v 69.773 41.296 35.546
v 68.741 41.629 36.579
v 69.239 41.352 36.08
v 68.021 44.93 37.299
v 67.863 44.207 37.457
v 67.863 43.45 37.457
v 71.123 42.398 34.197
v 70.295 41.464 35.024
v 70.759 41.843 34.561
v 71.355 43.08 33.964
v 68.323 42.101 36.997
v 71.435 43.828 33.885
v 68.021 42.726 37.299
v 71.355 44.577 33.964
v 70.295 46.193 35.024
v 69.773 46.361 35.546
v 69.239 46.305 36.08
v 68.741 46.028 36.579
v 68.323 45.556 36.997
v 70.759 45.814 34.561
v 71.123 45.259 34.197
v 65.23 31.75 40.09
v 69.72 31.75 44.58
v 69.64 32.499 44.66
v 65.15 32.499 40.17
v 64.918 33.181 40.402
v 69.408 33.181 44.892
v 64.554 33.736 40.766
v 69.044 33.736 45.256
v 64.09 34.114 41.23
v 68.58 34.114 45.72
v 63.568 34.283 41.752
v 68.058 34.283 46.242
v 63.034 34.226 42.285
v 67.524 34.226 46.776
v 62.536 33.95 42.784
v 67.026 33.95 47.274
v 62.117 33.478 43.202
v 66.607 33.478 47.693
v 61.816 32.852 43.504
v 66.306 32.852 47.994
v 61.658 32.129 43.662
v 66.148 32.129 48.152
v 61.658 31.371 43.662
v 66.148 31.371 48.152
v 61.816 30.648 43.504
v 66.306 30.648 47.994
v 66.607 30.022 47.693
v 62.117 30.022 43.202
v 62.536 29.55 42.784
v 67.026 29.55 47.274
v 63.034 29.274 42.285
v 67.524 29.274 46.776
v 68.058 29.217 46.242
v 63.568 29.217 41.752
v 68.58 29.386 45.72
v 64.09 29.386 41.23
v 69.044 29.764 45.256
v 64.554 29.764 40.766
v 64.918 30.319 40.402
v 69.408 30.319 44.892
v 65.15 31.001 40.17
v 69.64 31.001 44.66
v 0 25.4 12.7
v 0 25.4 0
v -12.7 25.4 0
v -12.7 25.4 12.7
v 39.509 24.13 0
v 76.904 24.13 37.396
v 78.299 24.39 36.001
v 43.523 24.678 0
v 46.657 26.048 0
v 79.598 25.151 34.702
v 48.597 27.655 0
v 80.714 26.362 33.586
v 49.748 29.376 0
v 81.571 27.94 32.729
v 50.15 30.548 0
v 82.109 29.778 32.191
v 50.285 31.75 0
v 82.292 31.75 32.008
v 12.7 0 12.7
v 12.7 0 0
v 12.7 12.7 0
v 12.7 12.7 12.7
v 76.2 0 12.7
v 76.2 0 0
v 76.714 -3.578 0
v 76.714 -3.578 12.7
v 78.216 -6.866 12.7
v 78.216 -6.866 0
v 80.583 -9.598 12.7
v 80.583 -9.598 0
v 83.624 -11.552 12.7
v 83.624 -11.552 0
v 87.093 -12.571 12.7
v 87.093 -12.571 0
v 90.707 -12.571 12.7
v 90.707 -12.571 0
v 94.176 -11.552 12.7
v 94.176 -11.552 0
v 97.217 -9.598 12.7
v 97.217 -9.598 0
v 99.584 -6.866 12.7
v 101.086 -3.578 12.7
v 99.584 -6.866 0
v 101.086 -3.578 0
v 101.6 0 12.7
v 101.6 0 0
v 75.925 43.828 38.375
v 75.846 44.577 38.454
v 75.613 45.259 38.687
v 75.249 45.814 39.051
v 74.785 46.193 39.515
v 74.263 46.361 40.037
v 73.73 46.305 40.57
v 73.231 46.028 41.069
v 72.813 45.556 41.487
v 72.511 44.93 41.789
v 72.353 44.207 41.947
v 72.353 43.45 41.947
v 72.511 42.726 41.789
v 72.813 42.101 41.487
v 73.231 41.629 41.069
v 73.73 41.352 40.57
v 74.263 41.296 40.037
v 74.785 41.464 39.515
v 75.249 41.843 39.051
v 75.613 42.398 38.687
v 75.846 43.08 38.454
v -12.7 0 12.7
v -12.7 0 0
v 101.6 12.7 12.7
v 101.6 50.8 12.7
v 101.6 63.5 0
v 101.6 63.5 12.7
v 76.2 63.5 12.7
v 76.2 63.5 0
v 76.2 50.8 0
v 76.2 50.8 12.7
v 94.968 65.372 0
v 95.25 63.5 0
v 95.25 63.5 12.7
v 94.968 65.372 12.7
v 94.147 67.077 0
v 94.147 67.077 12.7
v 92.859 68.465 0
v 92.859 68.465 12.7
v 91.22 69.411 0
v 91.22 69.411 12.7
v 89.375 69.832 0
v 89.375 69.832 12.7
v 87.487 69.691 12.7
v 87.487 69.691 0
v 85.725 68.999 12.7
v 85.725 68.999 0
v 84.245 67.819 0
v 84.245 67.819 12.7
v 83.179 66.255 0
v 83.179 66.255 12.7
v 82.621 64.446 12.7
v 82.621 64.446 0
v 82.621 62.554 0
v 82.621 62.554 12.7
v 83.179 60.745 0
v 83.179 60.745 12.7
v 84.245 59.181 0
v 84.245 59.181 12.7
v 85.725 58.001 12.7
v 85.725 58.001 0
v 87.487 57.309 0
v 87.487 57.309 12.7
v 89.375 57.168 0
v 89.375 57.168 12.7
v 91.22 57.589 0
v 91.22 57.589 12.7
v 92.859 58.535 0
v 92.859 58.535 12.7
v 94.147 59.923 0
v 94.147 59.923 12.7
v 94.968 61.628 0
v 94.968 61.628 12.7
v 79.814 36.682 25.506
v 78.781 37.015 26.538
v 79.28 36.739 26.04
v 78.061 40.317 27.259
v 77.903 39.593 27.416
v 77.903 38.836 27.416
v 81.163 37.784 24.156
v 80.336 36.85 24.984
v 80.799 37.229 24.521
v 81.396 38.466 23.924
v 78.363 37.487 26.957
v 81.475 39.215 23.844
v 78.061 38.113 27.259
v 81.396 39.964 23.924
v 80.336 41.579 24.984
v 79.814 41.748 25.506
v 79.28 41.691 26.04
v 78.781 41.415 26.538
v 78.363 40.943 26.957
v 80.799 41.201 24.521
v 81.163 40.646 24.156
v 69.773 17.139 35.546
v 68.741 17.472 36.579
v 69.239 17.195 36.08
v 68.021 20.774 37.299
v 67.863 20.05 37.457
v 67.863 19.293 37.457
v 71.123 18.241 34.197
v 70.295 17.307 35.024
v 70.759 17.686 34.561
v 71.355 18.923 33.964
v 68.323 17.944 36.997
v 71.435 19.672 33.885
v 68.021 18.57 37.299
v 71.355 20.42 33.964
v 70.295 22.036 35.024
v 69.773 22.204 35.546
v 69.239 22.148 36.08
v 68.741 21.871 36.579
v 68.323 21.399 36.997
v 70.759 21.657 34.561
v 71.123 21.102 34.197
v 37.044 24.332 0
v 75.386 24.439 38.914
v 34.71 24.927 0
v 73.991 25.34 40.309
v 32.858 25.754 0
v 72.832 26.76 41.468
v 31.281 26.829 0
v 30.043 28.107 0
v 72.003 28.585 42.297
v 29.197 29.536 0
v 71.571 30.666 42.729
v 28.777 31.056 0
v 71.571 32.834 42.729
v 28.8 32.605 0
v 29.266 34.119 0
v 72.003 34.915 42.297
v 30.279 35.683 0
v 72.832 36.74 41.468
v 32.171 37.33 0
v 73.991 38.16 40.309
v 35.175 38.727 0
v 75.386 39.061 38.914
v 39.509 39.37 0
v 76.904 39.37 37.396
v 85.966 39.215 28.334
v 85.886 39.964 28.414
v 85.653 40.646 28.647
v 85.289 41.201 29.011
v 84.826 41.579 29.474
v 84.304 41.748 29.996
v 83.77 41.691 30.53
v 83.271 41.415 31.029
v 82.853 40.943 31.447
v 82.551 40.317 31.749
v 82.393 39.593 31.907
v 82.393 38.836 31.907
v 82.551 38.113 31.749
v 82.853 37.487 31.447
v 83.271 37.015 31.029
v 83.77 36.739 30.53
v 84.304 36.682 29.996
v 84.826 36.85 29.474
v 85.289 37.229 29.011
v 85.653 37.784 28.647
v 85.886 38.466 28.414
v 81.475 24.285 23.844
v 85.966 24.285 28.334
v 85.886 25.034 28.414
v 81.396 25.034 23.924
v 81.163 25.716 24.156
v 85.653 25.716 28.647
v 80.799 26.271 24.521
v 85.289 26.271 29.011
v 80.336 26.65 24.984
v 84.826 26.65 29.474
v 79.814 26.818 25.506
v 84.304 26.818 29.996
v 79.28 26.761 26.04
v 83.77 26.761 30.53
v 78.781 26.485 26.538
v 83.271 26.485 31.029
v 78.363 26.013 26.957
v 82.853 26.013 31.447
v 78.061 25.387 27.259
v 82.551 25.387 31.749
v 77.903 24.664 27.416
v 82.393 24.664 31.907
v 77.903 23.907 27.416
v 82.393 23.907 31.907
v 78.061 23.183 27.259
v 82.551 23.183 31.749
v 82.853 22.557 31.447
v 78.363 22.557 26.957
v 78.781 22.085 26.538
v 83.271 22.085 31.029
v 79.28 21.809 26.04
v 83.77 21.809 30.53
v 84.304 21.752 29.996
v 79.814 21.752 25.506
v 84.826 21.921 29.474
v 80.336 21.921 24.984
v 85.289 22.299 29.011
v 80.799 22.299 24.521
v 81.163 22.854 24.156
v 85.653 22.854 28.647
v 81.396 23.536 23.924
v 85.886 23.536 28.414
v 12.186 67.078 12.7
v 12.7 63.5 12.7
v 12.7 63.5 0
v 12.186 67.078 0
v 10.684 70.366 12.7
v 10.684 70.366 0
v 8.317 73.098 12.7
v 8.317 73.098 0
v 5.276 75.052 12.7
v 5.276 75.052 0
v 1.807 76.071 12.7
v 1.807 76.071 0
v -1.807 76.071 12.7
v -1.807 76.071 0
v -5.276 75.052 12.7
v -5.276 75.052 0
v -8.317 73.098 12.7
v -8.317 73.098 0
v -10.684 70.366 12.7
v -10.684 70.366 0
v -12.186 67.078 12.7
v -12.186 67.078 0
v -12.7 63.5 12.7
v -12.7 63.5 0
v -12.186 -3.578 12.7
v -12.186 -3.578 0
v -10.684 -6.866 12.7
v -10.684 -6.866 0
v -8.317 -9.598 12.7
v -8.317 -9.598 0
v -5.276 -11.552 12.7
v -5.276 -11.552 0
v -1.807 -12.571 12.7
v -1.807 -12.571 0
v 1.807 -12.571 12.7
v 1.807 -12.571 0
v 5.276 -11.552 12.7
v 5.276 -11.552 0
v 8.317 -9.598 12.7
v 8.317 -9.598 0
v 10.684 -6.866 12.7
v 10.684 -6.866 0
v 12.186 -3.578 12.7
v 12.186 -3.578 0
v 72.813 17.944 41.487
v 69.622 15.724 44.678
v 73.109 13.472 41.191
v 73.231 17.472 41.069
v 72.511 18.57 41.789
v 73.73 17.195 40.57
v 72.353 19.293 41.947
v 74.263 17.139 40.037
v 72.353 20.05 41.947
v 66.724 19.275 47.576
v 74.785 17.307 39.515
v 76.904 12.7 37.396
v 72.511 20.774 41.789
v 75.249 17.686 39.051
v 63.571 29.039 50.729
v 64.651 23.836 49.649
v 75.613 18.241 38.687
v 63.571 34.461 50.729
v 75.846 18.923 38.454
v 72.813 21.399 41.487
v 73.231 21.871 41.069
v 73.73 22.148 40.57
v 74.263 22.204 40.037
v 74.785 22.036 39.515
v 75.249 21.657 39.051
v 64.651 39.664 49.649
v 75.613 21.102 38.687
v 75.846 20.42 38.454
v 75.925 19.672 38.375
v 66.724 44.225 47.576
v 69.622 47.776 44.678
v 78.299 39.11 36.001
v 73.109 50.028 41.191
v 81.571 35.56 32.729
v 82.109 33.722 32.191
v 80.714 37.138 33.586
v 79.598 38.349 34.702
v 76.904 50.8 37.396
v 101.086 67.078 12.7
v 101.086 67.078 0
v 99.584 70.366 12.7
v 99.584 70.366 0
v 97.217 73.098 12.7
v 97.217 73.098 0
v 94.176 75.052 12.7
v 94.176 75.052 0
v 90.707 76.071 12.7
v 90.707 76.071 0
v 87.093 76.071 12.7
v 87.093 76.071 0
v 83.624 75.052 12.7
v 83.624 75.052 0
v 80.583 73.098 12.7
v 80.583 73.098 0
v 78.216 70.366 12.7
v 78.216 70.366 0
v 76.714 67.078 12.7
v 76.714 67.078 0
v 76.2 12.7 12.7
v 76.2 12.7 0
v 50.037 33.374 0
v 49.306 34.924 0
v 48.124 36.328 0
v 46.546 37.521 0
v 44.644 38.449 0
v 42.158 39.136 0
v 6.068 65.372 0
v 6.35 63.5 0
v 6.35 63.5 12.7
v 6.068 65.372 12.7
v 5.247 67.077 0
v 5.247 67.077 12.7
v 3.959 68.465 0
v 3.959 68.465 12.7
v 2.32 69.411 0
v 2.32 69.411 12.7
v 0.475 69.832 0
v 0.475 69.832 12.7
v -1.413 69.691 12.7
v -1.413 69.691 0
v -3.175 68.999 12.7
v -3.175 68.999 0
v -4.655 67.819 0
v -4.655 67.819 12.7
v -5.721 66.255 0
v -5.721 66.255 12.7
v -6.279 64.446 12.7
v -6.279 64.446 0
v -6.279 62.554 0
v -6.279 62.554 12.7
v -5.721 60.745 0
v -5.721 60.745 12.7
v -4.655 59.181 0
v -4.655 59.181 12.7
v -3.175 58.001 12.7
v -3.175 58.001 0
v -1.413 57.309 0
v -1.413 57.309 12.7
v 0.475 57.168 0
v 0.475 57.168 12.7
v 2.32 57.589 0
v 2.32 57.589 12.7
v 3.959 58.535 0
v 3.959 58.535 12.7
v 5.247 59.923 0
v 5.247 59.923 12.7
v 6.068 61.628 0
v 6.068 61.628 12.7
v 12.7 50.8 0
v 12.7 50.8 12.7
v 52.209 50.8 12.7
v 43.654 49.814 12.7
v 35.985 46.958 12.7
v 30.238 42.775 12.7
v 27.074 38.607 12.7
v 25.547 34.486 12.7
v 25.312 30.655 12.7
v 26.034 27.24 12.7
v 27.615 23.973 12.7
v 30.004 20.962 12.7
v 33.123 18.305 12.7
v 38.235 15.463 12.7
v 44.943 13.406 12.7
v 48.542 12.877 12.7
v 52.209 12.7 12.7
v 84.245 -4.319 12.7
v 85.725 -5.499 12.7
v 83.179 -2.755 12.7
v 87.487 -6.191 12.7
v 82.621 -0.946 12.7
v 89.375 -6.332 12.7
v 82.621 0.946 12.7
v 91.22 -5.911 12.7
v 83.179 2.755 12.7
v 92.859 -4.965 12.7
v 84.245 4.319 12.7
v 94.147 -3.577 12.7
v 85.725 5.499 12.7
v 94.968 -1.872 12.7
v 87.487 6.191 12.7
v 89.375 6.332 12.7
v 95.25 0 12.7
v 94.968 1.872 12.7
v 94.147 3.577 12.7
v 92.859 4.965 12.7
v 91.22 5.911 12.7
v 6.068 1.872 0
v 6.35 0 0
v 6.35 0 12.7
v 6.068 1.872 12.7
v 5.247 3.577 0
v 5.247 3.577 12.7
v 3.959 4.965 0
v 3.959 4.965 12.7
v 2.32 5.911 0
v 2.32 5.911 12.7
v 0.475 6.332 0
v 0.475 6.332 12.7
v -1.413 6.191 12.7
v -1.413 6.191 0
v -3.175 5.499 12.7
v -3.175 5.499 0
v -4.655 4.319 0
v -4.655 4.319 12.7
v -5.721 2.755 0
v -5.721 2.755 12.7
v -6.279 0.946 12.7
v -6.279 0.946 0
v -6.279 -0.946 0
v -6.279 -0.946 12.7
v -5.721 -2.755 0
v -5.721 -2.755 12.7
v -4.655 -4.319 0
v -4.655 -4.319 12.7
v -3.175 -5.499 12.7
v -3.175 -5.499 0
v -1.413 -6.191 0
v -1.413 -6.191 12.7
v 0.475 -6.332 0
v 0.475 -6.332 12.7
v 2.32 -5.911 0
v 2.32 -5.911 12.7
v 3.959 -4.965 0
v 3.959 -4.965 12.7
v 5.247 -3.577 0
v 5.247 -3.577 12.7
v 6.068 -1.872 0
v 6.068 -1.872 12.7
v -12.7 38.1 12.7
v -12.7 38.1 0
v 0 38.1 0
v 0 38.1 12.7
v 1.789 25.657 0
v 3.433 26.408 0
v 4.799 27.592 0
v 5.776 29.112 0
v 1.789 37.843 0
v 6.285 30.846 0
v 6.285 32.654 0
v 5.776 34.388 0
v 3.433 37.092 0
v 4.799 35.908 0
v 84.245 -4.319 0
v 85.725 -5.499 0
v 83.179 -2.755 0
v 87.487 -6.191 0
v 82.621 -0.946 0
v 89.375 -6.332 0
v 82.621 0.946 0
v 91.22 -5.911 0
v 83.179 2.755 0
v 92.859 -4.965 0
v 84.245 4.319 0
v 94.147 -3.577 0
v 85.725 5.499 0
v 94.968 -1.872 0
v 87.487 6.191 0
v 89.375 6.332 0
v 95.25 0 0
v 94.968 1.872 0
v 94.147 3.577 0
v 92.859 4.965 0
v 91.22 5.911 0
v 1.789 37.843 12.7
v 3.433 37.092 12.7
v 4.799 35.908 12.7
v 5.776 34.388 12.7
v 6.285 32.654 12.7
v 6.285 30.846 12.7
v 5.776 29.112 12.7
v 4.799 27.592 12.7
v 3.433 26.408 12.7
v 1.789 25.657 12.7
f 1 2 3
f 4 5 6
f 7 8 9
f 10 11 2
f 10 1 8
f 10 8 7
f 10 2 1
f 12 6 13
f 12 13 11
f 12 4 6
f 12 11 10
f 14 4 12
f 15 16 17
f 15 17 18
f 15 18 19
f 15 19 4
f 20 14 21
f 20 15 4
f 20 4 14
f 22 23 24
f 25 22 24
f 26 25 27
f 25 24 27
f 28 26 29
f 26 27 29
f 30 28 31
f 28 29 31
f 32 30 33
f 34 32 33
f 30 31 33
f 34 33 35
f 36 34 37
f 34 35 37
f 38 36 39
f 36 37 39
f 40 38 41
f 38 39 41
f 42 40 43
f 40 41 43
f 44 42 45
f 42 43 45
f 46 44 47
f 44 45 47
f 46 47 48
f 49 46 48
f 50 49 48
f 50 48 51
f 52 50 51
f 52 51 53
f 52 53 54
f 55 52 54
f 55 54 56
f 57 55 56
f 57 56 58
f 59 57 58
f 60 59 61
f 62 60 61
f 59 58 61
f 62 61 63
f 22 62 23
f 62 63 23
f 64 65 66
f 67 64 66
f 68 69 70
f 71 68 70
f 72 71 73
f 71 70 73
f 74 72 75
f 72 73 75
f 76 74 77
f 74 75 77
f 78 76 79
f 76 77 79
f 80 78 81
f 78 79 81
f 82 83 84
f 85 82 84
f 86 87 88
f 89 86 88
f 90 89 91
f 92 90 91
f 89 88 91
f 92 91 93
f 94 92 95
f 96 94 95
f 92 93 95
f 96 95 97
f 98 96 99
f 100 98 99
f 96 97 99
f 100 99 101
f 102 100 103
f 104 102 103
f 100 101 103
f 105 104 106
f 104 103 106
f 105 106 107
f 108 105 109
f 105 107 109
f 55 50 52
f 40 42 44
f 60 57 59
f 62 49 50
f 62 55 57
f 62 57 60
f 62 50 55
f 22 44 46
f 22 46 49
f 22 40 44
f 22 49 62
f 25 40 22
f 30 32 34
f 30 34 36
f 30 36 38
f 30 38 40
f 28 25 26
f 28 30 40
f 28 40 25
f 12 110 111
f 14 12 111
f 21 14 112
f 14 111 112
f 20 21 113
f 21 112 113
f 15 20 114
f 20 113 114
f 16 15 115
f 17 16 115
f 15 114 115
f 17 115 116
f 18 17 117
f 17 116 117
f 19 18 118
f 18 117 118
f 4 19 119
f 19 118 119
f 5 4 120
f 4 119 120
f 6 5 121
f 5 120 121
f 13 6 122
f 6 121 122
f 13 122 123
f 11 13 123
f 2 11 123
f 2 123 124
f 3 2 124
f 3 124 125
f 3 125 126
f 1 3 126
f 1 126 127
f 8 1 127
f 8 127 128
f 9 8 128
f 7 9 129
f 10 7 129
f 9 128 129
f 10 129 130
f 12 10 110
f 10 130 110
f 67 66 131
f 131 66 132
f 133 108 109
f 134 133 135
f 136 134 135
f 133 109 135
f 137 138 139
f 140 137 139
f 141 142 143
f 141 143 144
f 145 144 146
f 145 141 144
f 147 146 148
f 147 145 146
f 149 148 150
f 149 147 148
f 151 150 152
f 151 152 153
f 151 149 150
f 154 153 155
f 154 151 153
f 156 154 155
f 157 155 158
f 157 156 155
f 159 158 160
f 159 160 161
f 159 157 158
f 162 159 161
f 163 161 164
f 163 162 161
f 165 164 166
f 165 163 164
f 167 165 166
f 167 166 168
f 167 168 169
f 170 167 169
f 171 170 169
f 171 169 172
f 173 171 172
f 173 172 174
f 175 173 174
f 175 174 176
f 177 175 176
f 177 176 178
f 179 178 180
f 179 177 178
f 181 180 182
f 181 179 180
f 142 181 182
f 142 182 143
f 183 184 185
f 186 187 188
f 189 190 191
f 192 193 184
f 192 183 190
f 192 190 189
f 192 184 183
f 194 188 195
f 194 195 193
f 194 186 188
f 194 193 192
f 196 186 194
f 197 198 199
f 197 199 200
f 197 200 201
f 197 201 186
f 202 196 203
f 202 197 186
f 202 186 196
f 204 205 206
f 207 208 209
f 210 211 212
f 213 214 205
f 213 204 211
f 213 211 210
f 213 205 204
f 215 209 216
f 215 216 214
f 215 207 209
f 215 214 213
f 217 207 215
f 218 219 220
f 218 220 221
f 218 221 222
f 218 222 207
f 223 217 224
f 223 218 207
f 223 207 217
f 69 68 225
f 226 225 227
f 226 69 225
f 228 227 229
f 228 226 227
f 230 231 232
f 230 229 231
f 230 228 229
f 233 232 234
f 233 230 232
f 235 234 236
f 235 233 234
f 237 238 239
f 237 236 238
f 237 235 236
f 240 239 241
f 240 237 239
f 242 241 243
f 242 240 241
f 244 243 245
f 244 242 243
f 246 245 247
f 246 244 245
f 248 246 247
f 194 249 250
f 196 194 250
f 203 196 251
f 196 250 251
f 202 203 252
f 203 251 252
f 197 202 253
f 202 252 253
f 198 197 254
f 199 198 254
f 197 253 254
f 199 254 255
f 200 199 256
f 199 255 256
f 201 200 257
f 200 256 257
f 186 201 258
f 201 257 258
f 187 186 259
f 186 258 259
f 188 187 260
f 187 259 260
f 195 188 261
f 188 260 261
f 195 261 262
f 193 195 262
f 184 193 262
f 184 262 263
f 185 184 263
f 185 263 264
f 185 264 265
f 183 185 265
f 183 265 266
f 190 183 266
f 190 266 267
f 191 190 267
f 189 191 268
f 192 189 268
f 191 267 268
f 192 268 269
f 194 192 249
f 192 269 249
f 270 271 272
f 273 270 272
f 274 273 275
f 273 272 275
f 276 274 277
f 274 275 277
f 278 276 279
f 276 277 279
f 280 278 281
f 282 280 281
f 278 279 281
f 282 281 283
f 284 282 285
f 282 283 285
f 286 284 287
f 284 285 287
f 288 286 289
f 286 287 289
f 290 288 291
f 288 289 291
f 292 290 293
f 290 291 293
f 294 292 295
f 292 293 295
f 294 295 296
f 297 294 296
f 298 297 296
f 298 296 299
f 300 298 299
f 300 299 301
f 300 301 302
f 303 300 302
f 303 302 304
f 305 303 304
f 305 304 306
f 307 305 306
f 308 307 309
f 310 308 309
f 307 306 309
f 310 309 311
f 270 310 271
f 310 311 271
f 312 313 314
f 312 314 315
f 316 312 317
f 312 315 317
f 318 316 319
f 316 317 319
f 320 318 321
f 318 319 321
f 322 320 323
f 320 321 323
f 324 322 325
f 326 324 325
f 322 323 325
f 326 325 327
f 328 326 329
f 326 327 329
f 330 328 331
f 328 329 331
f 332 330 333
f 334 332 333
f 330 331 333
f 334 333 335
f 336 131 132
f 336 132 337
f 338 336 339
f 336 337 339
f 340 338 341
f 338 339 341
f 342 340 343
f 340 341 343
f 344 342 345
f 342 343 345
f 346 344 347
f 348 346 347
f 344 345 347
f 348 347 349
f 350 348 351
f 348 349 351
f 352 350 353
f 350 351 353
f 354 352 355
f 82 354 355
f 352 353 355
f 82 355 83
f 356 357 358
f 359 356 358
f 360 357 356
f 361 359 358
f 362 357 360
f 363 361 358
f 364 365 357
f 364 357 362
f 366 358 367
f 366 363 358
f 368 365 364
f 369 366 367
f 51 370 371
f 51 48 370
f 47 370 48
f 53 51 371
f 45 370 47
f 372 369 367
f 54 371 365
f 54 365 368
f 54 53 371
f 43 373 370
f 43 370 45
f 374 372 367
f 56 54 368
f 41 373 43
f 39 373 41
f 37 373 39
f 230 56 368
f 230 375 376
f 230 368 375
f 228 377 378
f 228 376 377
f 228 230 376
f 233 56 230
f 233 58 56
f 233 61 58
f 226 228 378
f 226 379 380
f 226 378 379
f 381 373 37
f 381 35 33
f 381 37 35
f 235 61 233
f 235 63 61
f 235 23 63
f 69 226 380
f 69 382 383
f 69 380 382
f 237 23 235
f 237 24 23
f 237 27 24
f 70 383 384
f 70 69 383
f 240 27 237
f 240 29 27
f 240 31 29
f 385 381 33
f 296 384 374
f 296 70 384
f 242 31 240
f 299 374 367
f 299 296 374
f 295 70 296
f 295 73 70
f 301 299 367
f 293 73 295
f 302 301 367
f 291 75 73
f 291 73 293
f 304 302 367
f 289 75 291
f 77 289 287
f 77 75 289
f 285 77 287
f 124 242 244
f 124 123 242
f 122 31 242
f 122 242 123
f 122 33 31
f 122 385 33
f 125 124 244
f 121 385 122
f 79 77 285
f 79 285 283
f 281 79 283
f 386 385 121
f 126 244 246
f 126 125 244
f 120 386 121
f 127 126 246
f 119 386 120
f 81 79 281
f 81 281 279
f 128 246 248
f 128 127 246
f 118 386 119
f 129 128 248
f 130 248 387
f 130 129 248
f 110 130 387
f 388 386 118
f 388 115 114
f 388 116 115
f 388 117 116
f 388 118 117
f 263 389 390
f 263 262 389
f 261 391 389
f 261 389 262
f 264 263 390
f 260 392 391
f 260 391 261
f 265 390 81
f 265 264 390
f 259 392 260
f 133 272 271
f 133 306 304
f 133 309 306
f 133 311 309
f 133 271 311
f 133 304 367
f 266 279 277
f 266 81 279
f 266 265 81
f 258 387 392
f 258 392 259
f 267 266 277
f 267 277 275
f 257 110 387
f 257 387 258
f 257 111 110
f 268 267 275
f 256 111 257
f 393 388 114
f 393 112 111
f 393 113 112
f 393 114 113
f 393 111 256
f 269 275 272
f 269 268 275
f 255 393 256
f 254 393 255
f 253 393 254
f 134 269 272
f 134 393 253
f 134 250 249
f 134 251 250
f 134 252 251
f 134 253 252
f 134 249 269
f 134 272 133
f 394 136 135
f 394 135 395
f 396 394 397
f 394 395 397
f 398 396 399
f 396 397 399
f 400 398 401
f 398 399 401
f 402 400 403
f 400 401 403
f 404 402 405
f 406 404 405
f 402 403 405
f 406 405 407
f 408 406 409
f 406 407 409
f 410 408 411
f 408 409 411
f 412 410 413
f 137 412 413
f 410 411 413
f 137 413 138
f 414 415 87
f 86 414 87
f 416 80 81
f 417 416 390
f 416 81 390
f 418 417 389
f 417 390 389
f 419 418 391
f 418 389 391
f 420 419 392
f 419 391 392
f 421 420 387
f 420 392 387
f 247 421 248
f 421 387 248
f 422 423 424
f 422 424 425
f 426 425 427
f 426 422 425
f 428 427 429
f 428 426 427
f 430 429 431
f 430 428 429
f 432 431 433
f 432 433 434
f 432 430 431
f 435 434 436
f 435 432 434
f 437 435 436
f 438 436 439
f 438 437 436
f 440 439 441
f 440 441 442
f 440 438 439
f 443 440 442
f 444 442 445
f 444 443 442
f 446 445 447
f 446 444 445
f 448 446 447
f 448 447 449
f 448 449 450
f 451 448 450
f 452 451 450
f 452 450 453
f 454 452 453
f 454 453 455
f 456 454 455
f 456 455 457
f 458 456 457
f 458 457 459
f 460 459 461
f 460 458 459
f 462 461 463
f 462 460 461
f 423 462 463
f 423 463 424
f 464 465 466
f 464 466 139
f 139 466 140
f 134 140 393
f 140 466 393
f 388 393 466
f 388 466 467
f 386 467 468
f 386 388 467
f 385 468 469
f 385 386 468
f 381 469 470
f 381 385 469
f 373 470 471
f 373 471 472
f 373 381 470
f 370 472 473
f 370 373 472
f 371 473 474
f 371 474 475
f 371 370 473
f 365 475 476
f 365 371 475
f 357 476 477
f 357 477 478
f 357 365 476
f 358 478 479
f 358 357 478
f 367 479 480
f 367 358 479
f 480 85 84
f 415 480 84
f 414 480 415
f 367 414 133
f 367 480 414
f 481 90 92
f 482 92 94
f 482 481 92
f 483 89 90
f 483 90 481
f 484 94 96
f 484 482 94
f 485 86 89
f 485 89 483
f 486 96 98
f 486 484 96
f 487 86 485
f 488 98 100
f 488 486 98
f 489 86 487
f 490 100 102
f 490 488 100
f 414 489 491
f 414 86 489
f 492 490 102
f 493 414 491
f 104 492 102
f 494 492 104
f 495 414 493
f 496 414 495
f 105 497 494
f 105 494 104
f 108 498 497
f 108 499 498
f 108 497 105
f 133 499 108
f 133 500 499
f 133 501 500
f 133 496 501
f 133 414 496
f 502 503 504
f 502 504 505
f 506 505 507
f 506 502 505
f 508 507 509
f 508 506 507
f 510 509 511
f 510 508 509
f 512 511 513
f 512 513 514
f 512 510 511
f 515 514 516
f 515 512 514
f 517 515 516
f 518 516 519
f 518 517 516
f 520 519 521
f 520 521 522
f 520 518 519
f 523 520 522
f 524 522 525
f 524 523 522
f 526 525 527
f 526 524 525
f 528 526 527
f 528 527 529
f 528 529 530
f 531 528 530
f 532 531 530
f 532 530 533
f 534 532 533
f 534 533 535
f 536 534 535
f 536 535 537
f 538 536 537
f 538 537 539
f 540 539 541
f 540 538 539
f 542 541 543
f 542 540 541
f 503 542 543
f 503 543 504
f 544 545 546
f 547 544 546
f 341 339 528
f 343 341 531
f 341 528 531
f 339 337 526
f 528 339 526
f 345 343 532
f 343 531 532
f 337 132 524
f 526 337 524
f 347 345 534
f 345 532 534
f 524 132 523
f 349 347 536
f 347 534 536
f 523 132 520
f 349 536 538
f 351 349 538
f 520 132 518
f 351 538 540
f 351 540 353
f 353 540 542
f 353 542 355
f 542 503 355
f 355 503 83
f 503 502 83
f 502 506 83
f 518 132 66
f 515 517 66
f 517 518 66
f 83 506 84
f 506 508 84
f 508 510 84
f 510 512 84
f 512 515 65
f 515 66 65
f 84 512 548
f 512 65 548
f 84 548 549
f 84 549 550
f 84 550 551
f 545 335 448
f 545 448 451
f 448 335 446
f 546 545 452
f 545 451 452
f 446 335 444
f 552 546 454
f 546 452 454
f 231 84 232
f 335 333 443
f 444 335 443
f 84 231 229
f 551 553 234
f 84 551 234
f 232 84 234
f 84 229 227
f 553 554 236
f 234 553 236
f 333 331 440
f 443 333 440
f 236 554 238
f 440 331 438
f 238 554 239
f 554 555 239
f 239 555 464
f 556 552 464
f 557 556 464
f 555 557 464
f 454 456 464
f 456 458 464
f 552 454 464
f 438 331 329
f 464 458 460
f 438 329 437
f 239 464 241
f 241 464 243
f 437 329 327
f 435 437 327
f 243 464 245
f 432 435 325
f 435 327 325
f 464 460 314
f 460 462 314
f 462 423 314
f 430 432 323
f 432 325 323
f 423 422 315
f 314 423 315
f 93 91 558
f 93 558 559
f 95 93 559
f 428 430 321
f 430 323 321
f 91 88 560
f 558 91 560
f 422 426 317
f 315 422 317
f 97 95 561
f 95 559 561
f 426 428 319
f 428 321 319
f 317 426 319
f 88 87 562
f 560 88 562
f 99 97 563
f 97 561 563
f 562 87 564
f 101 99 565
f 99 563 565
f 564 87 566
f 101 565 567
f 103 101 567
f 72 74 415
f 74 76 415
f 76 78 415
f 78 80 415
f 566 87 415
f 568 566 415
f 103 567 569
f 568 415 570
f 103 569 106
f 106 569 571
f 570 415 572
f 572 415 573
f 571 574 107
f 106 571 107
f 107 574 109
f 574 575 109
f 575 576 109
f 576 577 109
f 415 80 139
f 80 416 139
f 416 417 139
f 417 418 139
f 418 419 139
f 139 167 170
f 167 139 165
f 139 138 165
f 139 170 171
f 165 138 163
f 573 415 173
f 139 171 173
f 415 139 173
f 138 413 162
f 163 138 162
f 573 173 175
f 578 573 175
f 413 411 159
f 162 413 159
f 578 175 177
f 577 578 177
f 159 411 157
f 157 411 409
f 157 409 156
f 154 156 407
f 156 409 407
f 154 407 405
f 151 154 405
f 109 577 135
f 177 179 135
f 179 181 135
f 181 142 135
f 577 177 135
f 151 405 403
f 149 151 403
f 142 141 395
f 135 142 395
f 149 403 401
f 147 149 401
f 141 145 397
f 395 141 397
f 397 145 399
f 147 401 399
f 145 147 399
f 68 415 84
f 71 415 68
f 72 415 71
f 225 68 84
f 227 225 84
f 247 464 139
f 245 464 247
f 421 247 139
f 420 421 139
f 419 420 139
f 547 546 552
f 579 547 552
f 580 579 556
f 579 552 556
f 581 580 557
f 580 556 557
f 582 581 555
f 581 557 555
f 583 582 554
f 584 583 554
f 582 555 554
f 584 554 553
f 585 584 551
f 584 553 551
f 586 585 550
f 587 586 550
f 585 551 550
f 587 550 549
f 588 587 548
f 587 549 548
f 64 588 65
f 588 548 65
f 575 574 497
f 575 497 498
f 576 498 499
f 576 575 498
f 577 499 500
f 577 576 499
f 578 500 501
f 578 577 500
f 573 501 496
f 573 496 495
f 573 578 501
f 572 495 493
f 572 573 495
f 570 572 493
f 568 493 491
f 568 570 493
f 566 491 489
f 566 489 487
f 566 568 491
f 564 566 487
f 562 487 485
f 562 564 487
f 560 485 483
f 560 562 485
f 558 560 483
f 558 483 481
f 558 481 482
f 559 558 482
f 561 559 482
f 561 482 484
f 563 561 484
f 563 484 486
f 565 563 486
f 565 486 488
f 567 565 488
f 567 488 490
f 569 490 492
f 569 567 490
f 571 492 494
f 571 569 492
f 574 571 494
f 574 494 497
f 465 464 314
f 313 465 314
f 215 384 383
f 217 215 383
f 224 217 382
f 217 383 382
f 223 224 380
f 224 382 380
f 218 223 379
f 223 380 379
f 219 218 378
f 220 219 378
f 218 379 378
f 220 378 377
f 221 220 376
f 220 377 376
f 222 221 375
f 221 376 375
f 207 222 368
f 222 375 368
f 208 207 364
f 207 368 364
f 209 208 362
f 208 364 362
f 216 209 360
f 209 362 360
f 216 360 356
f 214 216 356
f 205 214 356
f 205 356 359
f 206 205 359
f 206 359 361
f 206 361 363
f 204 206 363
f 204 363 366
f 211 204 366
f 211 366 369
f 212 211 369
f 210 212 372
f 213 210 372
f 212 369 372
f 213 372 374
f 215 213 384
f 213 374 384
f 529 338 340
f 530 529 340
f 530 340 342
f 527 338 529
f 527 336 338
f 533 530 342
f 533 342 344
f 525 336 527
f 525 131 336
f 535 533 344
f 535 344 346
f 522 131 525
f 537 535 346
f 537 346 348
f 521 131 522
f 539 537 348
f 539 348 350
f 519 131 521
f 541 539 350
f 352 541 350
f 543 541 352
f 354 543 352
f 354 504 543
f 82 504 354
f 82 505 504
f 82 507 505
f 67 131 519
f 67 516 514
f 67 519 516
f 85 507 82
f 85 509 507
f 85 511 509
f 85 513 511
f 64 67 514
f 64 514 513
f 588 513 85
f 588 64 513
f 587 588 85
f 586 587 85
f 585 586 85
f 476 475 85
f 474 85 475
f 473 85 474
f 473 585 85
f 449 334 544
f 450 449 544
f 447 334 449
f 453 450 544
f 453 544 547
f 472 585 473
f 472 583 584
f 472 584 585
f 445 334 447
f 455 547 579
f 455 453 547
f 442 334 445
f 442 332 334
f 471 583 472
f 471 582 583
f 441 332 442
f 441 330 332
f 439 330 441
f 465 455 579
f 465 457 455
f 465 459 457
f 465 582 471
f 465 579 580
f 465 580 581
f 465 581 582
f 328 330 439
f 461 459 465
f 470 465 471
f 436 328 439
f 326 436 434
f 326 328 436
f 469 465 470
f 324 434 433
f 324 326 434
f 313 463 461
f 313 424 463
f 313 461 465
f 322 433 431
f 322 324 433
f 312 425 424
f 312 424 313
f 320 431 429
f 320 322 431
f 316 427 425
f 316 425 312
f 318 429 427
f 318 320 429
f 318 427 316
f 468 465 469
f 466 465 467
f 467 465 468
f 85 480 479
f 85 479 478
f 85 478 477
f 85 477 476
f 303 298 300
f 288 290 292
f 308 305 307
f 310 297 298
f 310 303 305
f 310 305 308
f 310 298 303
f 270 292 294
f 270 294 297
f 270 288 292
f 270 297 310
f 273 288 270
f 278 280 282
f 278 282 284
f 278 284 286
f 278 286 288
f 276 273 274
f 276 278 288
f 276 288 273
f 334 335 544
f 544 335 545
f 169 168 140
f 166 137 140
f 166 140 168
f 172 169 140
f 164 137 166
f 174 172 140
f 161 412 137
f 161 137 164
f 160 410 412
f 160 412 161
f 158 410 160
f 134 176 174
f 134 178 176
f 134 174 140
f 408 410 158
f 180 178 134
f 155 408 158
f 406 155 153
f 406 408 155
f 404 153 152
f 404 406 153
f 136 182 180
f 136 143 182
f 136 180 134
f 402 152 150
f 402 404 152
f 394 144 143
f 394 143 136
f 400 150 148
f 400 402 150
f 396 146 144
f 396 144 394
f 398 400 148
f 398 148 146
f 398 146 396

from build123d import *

# Parameters (mm, degrees)
F0_R             = 6.35
F1_DEPTH         = 12.7
F3_DEPTH         = 38.1
F7_DEPTH         = 89.8035612107
F8_R             = 2.54
F9_DEPTH         = 6.35
F9_COPIES_COUNT  = 2
F9_COPIES_PITCH  = 14.929745
F9_COPIES1_COUNT = 2
F9_COPIES1_PITCH = 14.929745
F9_COPIES2_COUNT = 2
F9_COPIES2_PITCH = 24.156836
F9_COPIES3_COUNT = 2
F9_COPIES3_PITCH = 24.156836


# Not quite as in the source:
# - a pattern or mirror of a feature is missing from the dataset's text; its kind, count and spacing are read off the source's solid


with BuildPart() as f1:
    # F0 (on Top) → F1 (new body)
    with BuildSketch(Plane.XY):
        with BuildLine():
            Line((12.7, 50.8), (12.7, 63.5))
            ThreePointArc((12.7, 63.5), (0, 76.2), (-12.7, 63.5))
            Line((-12.7, 63.5), (-12.7, 38.1))
            Line((-12.7, 38.1), (0, 38.1))
            ThreePointArc((0, 38.1), (6.35, 31.75), (0, 25.4))
            Line((0, 25.4), (-12.7, 25.4))
            Line((-12.7, 25.4), (-12.7, 0))
            ThreePointArc((-12.7, 0), (0, -12.7), (12.7, 0))
            Line((12.7, 0), (12.7, 12.7))
            Line((12.7, 12.7), (76.2, 12.7))
            Line((76.2, 12.7), (76.2, 0))
            ThreePointArc((76.2, 0), (88.9, -12.7), (101.6, 0))
            Line((101.6, 0), (101.6, 63.5))
            ThreePointArc((101.6, 63.5), (88.9, 76.2), (76.2, 63.5))
            Line((76.2, 63.5), (76.2, 50.8))
            Line((76.2, 50.8), (12.7, 50.8))
        make_face()
        Circle(F0_R, mode=Mode.SUBTRACT)
        with Locations((88.9, 0)):
            Circle(F0_R, mode=Mode.SUBTRACT)
        with Locations((0, 63.5)):
            Circle(F0_R, mode=Mode.SUBTRACT)
        with Locations((88.9, 63.5)):
            Circle(F0_R, mode=Mode.SUBTRACT)
    extrude(amount=F1_DEPTH)

    # F2 (on face) → F3 (join)
    with BuildSketch(Plane.XZ.offset(-12.7)):
        Polygon((76.2, 12.7), (101.6, 12.7), (76.9042956671, 37.3957043329), (52.2085913341, 12.7), align=None)
    extrude(amount=-F3_DEPTH)

    # F4 (on face) → F5 (join, up to the next surface of F1)
    with BuildSketch(Plane(origin=(57.15, 0, 57.15), x_dir=(0.7071067812, 0, -0.7071067812), z_dir=(0.7071067812, 0, 0.7071067812))):
        with BuildLine():
            ThreePointArc((27.9367928475, 24.13), (20.3167928475, 31.75), (27.9367928475, 39.37))
            Line((27.9367928475, 39.37), (27.9367928475, 50.8))
            ThreePointArc((27.9367928475, 50.8), (8.8867928475, 31.75), (27.9367928475, 12.7))
            Line((27.9367928475, 12.7), (27.9367928475, 24.13))
        make_face()
    extrude(until=Until.NEXT, dir=(-0.7071067812, 0, -0.7071067812))

    # F6 (on face) → F7 (cut, through all)
    with BuildSketch(Plane(origin=(57.15, 0, 57.15), x_dir=(0.7071067812, 0, -0.7071067812), z_dir=(0.7071067812, 0, 0.7071067812))):
        with BuildLine():
            ThreePointArc((27.9367928475, 24.13), (33.3249465201, 26.3618463274), (35.5567928475, 31.75))
            ThreePointArc((35.5567928475, 31.75), (33.3249465201, 37.1381536726), (27.9367928475, 39.37))
            Line((27.9367928475, 39.37), (27.9367928475, 24.13))
        make_face()
        with BuildLine():
            Line((27.9367928475, 24.13), (27.9367928475, 39.37))
            ThreePointArc((27.9367928475, 39.37), (20.3167928475, 31.75), (27.9367928475, 24.13))
        make_face()
    extrude(amount=-F7_DEPTH, mode=Mode.SUBTRACT)

    # F8 (on face) → F9 (cut)
    with BuildSketch(Plane(origin=(57.15, 0, 57.15), x_dir=(0.7071067812, 0, -0.7071067812), z_dir=(0.7071067812, 0, 0.7071067812))):
        with Locations((15.2367928475, 31.75)):
            Circle(F8_R)
    f9 = extrude(amount=-F9_DEPTH, mode=Mode.SUBTRACT)

    # F9_copies: F9 ×2
    with Locations(*[Vector(0.4156269378, 0.8090169944, -0.4156269378) * (i * F9_COPIES_PITCH) for i in range(1, F9_COPIES_COUNT)]):
        add(f9, mode=Mode.SUBTRACT)

    # F9_copies1: F9 ×2
    with Locations(*[Vector(0.4156269378, -0.8090169944, -0.4156269378) * (i * F9_COPIES1_PITCH) for i in range(1, F9_COPIES1_COUNT)]):
        add(f9, mode=Mode.SUBTRACT)

    # F9_copies2: F9 ×2
    with Locations(*[Vector(0.672498512, -0.3090169944, -0.672498512) * (i * F9_COPIES2_PITCH) for i in range(1, F9_COPIES2_COUNT)]):
        add(f9, mode=Mode.SUBTRACT)

    # F9_copies3: F9 ×2
    with Locations(*[Vector(0.672498512, 0.3090169944, -0.672498512) * (i * F9_COPIES3_PITCH) for i in range(1, F9_COPIES3_COUNT)]):
        add(f9, mode=Mode.SUBTRACT)


solid = f1.part
